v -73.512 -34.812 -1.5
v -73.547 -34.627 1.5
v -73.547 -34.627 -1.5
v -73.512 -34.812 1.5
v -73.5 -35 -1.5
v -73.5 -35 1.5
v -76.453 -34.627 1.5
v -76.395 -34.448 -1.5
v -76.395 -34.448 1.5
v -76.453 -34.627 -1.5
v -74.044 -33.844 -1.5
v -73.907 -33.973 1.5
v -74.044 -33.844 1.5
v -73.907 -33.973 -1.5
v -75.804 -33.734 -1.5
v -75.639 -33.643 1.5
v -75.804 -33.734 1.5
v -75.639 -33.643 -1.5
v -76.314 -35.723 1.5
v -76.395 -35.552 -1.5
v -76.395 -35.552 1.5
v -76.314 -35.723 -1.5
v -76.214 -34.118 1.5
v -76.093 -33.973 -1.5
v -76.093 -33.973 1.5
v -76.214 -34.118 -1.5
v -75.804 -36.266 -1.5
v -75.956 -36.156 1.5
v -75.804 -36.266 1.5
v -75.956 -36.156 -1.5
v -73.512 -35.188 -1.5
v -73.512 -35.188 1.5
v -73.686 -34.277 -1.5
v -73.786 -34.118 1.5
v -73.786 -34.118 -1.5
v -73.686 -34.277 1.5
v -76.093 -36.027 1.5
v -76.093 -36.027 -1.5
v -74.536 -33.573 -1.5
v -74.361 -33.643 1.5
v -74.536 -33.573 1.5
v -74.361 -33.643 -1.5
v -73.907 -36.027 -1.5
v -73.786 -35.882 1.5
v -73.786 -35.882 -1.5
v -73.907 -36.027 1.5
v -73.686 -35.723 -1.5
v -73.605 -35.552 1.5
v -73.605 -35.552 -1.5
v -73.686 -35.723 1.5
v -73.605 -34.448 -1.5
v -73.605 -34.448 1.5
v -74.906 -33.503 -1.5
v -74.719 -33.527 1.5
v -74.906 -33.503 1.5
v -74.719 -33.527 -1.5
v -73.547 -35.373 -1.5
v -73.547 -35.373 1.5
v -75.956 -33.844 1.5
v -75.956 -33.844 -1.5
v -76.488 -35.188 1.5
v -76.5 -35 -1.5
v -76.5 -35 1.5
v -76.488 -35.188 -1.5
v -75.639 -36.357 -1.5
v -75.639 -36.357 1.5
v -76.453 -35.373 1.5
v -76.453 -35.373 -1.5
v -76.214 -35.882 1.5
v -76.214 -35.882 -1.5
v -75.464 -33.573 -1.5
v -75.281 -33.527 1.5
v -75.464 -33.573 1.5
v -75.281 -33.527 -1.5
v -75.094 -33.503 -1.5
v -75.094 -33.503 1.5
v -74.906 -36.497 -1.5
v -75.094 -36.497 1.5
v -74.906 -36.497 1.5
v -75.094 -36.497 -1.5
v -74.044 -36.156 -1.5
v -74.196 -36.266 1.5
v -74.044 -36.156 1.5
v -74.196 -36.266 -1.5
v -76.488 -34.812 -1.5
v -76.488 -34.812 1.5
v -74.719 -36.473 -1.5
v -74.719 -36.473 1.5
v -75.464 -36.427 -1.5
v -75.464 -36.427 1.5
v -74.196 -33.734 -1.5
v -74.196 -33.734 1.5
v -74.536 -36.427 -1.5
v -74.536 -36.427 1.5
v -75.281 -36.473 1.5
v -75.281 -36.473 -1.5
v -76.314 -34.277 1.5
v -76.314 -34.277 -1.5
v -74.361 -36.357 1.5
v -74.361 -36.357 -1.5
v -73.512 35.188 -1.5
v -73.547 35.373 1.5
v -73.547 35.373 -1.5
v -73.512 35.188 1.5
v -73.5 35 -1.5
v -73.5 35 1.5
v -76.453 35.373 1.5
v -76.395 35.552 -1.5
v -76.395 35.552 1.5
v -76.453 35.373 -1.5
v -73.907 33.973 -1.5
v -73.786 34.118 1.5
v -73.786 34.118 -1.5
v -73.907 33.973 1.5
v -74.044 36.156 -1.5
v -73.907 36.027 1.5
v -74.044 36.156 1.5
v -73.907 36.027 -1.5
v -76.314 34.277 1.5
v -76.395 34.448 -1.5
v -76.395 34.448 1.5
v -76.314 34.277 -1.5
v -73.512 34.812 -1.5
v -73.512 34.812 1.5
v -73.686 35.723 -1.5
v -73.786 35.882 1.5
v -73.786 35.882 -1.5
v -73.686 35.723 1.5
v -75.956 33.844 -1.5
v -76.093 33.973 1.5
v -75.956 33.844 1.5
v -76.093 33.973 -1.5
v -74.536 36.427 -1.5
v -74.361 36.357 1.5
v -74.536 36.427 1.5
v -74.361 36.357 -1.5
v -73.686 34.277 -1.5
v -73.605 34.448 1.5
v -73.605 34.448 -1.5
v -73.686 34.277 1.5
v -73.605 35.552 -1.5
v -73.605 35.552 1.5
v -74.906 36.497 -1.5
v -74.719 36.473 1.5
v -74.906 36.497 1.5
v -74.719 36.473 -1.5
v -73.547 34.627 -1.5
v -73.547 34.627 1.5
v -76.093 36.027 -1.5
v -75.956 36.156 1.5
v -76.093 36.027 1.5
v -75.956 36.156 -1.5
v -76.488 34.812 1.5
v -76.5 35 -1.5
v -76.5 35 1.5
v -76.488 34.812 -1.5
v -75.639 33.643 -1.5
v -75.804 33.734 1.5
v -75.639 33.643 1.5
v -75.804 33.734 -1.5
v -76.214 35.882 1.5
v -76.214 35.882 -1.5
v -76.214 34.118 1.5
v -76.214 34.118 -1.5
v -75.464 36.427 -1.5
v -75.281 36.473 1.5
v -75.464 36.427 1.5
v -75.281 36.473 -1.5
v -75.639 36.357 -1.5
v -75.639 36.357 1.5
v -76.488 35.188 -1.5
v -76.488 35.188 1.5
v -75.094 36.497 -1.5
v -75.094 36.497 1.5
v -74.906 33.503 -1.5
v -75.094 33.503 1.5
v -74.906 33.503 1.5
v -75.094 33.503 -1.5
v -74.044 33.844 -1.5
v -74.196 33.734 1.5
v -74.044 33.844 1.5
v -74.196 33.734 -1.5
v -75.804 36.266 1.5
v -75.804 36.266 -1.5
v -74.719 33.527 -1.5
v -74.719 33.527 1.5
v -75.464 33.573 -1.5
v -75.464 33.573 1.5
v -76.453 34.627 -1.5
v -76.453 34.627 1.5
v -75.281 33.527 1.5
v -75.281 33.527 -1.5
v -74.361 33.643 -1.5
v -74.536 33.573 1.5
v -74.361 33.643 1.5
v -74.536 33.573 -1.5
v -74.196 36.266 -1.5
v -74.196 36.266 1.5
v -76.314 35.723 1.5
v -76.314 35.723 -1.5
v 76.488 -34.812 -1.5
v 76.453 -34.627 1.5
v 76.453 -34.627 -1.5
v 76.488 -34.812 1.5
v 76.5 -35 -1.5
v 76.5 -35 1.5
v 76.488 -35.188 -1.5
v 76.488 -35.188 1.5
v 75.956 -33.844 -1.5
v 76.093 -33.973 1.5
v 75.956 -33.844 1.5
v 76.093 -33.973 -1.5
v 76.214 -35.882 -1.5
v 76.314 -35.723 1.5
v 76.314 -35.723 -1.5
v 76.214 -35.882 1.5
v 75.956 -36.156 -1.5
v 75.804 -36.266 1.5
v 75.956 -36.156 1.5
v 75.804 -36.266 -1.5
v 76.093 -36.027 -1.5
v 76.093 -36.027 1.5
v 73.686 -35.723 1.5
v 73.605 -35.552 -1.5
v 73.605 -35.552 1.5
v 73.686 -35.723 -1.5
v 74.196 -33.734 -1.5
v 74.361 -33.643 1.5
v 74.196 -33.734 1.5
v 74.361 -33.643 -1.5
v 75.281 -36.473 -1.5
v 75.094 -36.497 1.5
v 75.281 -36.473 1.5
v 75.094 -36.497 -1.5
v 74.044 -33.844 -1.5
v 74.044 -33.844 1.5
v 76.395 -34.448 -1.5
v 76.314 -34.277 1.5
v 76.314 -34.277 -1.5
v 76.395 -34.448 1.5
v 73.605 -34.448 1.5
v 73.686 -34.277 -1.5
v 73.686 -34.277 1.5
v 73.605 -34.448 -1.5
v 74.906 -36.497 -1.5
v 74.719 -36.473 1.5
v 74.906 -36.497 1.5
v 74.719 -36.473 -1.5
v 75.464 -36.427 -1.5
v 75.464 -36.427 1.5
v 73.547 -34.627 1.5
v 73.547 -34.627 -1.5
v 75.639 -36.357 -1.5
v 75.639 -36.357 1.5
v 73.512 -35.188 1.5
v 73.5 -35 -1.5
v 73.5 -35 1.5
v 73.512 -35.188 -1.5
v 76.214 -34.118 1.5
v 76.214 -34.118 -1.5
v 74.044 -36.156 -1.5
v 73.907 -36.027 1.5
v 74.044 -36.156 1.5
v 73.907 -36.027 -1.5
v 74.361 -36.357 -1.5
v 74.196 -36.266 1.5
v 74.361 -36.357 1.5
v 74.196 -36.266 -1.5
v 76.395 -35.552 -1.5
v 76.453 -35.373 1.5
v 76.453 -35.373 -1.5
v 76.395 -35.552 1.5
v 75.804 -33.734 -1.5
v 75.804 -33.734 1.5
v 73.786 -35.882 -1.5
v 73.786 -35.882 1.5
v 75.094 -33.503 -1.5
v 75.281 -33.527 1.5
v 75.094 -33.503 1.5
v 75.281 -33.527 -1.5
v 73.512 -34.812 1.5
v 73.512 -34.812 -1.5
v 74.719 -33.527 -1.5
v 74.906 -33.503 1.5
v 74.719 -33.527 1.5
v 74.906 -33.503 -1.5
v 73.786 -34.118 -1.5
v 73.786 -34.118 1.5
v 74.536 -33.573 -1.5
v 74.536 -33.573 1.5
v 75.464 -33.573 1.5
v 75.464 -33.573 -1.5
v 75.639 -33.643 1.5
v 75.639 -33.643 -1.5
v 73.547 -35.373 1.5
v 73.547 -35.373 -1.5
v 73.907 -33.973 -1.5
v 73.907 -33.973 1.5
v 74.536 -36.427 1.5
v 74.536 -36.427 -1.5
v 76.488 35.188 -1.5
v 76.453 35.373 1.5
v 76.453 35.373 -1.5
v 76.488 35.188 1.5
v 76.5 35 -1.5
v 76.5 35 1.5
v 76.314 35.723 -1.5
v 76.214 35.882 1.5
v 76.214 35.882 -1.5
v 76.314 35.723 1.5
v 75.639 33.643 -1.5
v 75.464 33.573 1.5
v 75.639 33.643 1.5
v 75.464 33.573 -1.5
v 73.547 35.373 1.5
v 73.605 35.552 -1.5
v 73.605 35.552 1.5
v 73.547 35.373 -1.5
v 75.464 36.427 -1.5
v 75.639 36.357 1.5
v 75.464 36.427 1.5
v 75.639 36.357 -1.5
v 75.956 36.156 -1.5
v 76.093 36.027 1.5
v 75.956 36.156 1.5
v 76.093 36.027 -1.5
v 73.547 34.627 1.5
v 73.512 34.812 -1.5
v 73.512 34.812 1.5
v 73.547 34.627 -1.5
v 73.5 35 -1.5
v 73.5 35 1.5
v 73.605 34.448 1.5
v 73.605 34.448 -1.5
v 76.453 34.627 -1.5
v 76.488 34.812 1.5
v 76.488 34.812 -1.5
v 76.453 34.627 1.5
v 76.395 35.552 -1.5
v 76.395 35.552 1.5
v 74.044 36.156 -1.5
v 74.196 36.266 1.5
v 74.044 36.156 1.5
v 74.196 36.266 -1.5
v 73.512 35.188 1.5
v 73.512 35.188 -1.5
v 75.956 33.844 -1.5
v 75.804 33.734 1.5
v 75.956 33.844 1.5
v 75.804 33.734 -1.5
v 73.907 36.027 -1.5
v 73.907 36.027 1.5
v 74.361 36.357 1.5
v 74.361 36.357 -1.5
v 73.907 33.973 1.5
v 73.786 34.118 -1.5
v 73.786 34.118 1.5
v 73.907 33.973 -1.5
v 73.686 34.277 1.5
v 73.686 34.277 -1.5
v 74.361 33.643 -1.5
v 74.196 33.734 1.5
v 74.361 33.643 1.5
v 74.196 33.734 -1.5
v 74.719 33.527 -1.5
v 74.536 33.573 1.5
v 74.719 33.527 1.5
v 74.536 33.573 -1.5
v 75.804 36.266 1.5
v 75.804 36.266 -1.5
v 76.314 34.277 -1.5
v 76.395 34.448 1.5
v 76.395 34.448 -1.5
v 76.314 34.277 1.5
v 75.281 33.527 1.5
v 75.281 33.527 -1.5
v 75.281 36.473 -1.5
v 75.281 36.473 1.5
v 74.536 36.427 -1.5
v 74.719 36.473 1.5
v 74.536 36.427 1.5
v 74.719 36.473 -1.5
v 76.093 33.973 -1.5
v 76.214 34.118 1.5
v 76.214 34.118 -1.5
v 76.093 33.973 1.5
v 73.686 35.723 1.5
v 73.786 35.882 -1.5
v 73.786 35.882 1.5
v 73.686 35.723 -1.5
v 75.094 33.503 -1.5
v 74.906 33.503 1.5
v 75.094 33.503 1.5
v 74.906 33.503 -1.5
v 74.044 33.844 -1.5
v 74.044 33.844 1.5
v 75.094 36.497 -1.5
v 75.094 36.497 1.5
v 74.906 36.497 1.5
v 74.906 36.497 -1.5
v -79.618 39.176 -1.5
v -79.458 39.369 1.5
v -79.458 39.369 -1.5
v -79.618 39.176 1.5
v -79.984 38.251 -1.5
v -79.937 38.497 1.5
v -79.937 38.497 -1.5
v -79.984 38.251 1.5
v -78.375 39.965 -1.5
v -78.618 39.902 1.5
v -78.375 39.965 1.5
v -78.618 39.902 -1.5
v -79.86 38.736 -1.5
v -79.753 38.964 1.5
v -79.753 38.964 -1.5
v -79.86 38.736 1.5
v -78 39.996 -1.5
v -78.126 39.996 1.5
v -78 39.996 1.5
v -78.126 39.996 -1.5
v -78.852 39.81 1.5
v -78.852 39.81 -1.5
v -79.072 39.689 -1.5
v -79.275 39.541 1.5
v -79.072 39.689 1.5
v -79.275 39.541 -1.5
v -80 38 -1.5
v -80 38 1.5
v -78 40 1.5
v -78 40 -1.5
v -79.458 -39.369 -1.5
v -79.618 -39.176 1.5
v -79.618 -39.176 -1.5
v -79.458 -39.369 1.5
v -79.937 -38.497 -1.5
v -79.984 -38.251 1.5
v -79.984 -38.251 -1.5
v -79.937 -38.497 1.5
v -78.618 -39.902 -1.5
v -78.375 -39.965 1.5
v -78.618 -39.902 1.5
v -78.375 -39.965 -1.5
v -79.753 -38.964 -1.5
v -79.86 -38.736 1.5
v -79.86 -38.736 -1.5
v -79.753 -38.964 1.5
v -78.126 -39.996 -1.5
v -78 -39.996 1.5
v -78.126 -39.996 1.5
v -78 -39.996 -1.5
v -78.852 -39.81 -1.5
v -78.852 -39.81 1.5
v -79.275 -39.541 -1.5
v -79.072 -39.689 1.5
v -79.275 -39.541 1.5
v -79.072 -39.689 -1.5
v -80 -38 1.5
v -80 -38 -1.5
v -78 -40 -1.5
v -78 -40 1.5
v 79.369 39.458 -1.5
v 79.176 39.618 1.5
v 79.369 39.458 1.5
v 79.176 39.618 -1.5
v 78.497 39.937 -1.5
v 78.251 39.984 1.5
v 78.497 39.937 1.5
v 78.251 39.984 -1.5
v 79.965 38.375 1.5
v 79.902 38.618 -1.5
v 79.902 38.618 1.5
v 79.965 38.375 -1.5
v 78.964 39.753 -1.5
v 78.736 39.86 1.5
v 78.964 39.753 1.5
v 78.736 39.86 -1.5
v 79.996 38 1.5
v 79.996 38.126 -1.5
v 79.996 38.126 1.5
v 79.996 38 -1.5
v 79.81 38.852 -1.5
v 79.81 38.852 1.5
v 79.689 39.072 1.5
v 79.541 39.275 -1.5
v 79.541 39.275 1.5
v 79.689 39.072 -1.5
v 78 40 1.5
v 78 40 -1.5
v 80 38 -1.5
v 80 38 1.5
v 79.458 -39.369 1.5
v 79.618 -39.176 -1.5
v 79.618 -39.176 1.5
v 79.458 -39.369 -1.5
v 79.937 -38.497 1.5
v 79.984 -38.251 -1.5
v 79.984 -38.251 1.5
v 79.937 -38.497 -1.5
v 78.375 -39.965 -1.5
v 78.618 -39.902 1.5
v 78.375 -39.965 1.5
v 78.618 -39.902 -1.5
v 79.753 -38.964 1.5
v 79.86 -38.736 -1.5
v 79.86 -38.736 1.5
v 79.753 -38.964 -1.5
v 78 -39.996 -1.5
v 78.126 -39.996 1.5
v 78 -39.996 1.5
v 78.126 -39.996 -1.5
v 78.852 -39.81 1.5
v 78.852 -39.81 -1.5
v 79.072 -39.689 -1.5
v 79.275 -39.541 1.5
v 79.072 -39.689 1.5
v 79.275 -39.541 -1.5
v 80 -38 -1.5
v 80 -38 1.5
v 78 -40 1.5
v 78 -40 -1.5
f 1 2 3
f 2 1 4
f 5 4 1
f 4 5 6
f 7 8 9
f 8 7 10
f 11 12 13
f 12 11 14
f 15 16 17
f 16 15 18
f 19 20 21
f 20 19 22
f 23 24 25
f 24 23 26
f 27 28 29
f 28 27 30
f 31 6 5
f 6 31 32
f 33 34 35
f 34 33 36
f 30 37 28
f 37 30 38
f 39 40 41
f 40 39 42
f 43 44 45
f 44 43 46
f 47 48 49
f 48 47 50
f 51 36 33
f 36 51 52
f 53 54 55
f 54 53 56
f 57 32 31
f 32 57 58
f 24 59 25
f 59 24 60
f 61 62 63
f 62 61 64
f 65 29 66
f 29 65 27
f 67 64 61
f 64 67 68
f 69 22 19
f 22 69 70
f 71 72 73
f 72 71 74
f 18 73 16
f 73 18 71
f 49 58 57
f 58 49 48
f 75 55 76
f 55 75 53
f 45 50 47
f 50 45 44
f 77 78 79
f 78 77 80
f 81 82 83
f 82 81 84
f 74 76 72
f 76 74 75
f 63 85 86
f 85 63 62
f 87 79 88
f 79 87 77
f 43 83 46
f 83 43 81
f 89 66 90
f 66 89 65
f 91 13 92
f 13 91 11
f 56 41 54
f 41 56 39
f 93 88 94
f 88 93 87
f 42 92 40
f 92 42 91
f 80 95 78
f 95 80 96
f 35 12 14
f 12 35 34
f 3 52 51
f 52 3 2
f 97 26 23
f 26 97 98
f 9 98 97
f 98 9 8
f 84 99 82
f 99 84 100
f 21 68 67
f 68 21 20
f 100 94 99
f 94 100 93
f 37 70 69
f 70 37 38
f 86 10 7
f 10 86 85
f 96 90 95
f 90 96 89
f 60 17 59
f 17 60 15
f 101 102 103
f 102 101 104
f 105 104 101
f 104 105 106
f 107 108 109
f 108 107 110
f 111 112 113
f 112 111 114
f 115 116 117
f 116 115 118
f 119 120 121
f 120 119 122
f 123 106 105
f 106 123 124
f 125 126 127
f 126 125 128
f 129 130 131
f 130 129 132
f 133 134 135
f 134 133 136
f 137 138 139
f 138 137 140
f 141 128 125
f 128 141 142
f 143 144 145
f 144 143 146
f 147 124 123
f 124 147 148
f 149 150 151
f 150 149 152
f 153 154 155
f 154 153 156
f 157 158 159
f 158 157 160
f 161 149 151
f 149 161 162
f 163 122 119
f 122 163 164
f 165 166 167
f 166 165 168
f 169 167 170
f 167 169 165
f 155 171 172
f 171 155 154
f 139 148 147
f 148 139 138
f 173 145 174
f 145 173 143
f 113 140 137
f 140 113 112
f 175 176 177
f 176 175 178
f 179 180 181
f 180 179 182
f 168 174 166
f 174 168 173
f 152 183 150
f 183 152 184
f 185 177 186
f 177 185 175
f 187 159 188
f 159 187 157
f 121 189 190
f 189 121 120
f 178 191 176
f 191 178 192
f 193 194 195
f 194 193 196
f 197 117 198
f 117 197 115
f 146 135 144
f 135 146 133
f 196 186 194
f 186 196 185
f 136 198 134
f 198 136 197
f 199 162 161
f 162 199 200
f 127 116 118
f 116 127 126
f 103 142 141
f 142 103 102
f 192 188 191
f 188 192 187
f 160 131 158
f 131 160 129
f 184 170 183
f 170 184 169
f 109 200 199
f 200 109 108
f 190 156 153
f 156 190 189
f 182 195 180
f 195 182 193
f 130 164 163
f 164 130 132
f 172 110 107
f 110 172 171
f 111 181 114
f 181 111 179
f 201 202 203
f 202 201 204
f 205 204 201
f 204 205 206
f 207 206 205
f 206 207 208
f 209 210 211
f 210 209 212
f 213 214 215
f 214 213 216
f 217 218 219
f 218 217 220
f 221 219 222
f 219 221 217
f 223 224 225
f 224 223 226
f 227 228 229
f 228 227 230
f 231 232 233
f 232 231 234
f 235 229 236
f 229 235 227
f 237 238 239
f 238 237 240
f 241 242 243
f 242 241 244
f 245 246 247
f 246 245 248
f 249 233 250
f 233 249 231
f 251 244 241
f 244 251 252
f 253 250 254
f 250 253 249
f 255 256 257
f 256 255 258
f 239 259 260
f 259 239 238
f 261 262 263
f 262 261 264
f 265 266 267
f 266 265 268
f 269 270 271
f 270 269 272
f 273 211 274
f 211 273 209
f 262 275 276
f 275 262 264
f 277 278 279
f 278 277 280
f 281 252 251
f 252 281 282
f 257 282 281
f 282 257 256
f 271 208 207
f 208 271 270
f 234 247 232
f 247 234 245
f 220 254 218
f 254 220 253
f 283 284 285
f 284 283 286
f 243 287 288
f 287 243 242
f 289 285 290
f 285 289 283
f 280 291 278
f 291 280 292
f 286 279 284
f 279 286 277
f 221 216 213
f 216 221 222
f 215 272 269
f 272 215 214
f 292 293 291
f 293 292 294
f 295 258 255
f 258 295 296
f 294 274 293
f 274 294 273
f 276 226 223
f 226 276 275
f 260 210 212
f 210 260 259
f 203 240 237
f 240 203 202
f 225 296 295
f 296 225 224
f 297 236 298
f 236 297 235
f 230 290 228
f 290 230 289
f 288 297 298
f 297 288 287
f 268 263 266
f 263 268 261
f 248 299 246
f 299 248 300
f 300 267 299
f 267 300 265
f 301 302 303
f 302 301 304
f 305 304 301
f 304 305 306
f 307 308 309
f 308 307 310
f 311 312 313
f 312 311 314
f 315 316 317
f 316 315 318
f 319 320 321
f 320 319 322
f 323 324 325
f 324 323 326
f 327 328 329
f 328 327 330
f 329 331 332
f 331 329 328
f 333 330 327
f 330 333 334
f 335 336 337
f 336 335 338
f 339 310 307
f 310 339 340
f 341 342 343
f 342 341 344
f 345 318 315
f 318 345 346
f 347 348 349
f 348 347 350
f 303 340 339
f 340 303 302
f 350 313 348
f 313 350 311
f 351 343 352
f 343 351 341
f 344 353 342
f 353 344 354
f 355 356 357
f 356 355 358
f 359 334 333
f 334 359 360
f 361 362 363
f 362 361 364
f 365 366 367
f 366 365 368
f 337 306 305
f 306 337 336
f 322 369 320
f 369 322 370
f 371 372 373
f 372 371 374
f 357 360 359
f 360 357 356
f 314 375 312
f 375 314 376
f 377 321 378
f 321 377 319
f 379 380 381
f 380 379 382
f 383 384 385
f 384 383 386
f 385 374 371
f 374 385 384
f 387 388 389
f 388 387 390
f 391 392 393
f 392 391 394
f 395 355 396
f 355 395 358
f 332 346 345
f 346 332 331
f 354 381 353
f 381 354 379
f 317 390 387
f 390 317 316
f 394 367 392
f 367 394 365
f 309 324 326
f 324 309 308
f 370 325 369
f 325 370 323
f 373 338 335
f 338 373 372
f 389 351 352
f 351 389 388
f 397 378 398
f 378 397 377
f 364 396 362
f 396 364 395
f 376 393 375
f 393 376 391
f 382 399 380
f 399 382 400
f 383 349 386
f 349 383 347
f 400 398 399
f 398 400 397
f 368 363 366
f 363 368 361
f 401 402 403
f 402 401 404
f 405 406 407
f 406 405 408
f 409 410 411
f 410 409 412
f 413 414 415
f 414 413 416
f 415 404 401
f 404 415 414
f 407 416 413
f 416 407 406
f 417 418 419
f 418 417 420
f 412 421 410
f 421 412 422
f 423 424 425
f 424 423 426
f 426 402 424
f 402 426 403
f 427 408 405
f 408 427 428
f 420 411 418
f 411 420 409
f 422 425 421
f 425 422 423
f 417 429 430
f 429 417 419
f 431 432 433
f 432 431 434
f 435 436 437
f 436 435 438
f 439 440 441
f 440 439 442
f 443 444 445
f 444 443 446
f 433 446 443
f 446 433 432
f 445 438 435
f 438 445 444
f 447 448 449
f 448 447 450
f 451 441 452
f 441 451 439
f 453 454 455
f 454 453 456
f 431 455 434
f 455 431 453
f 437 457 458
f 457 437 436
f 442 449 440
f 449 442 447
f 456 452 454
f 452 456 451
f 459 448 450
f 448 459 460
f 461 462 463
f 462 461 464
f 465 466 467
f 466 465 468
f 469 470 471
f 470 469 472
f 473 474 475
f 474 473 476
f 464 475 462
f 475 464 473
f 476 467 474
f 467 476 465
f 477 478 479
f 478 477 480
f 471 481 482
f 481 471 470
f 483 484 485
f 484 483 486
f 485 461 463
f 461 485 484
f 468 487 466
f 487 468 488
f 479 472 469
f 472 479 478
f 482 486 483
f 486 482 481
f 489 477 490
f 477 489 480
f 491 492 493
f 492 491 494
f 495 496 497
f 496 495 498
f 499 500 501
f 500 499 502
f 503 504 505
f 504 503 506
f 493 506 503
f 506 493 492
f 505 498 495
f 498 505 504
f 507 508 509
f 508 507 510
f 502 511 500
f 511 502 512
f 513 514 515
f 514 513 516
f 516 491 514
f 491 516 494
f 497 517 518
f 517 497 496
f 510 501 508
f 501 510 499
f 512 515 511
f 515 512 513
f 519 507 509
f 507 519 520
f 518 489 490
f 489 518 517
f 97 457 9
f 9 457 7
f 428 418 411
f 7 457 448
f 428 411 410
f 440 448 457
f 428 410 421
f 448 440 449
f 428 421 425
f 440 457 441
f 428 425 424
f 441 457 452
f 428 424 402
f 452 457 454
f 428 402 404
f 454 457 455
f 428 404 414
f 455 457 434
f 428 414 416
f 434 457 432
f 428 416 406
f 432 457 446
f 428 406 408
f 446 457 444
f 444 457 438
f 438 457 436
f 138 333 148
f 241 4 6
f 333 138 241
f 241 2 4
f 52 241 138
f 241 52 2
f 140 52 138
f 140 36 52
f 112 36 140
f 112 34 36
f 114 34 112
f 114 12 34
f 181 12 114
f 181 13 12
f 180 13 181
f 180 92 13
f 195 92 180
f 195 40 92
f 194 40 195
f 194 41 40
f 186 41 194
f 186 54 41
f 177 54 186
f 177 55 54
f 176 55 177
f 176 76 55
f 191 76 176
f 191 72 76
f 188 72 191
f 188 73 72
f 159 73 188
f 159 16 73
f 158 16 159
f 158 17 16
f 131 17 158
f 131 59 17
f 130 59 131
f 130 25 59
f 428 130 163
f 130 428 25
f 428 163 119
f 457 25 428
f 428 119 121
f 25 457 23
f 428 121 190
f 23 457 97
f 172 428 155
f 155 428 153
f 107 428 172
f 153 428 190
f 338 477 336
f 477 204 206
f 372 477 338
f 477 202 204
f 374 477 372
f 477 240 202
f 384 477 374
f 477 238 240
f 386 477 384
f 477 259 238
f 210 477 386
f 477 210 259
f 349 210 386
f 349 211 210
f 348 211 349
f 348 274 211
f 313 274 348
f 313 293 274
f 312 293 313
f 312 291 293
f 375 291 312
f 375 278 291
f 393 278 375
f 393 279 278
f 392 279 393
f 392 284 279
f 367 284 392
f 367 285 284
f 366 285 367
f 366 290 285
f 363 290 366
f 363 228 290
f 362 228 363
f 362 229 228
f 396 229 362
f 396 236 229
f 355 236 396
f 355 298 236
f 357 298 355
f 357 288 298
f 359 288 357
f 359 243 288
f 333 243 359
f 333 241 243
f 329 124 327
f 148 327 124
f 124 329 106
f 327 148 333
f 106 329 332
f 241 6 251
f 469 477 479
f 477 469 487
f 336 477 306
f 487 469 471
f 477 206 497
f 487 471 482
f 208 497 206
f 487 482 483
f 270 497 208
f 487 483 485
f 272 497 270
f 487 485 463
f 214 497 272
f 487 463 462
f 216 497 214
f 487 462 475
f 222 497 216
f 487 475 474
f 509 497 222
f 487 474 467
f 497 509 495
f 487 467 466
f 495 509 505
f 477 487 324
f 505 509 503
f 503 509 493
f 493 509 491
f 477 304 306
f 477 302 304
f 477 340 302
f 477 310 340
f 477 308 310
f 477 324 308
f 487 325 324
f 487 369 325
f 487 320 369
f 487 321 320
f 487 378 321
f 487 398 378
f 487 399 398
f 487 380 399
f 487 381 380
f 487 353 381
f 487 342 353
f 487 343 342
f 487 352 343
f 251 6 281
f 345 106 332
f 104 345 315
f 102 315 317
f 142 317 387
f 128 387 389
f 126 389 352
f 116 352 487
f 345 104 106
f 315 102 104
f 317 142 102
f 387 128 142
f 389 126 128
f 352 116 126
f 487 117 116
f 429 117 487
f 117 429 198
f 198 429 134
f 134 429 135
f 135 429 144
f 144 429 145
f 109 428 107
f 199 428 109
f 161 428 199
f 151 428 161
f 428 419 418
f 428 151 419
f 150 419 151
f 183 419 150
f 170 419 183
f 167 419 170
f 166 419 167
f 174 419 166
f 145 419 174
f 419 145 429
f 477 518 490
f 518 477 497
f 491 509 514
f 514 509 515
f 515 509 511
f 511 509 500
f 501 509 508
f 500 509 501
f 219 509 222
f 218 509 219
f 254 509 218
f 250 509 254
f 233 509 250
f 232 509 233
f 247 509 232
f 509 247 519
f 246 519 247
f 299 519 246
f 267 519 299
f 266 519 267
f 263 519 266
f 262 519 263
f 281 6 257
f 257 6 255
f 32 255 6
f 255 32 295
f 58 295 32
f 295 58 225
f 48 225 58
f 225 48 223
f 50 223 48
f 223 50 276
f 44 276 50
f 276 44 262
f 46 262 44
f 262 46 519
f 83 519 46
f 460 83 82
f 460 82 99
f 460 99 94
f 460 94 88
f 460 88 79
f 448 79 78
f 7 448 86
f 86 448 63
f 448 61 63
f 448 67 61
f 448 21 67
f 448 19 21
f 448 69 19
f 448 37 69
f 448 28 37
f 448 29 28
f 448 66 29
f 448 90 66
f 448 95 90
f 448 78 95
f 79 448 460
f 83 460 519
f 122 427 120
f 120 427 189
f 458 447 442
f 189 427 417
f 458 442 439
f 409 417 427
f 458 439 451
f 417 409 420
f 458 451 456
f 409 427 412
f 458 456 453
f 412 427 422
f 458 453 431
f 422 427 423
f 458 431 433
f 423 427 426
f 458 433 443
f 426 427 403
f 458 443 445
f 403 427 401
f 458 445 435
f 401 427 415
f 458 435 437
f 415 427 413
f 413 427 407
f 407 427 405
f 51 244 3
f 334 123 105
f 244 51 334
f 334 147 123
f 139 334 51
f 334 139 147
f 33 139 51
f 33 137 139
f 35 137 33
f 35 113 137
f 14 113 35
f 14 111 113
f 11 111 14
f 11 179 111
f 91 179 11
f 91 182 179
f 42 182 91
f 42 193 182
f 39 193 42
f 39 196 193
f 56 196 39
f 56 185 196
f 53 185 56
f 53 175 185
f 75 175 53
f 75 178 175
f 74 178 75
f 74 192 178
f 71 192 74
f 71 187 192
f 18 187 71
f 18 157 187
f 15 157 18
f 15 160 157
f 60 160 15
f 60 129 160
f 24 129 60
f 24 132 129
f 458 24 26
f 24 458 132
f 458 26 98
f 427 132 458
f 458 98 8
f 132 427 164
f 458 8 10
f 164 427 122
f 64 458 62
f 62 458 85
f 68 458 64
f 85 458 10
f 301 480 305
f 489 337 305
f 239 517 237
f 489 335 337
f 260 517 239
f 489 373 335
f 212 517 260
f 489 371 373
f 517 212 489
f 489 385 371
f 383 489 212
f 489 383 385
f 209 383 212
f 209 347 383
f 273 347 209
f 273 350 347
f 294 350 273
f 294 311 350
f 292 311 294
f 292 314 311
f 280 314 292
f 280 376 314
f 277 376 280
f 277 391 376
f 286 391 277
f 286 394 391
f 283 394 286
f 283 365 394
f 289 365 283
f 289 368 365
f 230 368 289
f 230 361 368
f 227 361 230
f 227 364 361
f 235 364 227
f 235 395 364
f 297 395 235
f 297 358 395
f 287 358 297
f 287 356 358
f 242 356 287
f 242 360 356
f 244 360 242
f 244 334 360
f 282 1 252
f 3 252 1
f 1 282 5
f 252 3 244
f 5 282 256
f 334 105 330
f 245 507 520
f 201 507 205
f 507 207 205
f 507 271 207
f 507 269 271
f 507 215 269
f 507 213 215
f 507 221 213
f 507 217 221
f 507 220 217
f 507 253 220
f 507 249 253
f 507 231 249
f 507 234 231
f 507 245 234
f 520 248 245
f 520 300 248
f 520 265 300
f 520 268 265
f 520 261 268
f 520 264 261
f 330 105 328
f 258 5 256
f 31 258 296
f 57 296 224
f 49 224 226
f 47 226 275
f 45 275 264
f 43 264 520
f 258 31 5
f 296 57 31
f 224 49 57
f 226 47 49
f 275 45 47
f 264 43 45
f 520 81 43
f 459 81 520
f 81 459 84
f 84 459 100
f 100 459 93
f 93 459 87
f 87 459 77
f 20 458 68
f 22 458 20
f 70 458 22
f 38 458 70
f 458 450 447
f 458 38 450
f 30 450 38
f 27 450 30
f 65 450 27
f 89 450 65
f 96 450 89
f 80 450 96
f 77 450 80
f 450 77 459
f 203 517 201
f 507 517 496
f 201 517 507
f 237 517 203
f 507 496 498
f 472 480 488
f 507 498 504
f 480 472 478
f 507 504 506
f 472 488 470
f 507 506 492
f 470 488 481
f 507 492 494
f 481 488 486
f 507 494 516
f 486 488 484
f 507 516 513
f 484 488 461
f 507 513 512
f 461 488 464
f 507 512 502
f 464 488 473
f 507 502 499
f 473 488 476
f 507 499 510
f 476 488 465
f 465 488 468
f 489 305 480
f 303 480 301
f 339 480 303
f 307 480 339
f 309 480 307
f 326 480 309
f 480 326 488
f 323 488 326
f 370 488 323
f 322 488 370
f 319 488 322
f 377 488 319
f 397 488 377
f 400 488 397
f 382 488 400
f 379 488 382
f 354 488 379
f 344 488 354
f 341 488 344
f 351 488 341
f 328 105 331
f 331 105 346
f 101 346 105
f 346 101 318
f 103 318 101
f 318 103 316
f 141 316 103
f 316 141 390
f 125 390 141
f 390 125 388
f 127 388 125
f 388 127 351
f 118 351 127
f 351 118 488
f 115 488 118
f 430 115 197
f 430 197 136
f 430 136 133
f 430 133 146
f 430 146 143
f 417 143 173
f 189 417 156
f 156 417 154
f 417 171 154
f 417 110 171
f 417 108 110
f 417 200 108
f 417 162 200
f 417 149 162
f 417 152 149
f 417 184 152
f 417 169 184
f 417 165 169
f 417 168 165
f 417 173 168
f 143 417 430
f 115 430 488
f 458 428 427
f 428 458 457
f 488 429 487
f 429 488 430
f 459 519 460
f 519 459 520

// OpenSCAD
// file: ../LIB/round_corner_mask.scad
// Copyright (c) 2014 Jérémie DECOCK <jd.jdhp@gmail.com>

module round_corner_mask(radius, spacing_x, spacing_y, height) {
	$fn=50;
	
    difference() {
        cube([2*radius+1, 2*radius+1, height], center=true);
        union() {
            cylinder(r=radius, h=height+2, center=true);
            translate([(radius+2)/2, 0, 0]) cube([radius+2, 2*radius+2, height+2], center=true);
            translate([0, (radius+2)/2, 0]) cube([2*radius+2, radius+2, height+2], center=true);
        }
    }
}

module board_round_4_corner_mask(radius, width, depth, height) {
    spacing_x = width - 2 * radius;
    spacing_y = depth - 2 * radius;
    height = height + 1;

    translate([-spacing_x/2,  spacing_y/2, 0]) mirror([0,1,0]) round_corner_mask(radius, spacing_x, spacing_y, height);
    translate([-spacing_x/2, -spacing_y/2, 0]) mirror([0,0,0]) round_corner_mask(radius, spacing_x, spacing_y, height);
    translate([ spacing_x/2,  spacing_y/2, 0]) mirror([1,1,0]) round_corner_mask(radius, spacing_x, spacing_y, height);
    translate([ spacing_x/2, -spacing_y/2, 0]) mirror([1,0,0]) round_corner_mask(radius, spacing_x, spacing_y, height);
}
// file: ../LIB/four_screw_holes.scad
// Copyright (c) 2014 Jérémie DECOCK <jd.jdhp@gmail.com>

/////////////////////////////////////////////

module four_screw_holes(radius, spacing_x, spacing_y, height) {
	for (i = [-1, 1]) {    
        for (j = [-1, 1]) {    
            translate([i*spacing_x/2, j*spacing_y/2, 0]) {        
                cylinder(r=radius, h=height, center=true, $fn=50);
            }
        }
	}
}
// file: empty_board.scad
// 2 wheel robot for Raspberry Pi (model B).

// Copyright (c) 2014 Jérémie DECOCK <jd.jdhp@gmail.com>

use <../LIB/four_screw_holes.scad>
use <../LIB/round_corner_mask.scad>

/////////////////////////////////////////////

module empty_board() {

    screw_holes_radius = 1.5;
    screw_holes_spacing_x = 150;
    screw_holes_spacing_y = 70;
    board_height = 3;
    board_corner_radius = 2;
    board_width = screw_holes_spacing_x + 10;
    board_depth = screw_holes_spacing_y + 10;

    difference() {
        cube([board_width, board_depth, board_height], center=true);
        #four_screw_holes(screw_holes_radius, screw_holes_spacing_x, screw_holes_spacing_y, board_height+1);
        #board_round_4_corner_mask(radius=board_corner_radius, width=board_width, depth=board_depth, height=board_height);
    }
}
// main file
// 2 wheel robot for Raspberry Pi (model B).

// Copyright (c) 2014 Jérémie DECOCK <jd.jdhp@gmail.com>

use <empty_board.scad>

/////////////////////////////////////////////

module pcb_board() {
    empty_board();
}

pcb_board();
